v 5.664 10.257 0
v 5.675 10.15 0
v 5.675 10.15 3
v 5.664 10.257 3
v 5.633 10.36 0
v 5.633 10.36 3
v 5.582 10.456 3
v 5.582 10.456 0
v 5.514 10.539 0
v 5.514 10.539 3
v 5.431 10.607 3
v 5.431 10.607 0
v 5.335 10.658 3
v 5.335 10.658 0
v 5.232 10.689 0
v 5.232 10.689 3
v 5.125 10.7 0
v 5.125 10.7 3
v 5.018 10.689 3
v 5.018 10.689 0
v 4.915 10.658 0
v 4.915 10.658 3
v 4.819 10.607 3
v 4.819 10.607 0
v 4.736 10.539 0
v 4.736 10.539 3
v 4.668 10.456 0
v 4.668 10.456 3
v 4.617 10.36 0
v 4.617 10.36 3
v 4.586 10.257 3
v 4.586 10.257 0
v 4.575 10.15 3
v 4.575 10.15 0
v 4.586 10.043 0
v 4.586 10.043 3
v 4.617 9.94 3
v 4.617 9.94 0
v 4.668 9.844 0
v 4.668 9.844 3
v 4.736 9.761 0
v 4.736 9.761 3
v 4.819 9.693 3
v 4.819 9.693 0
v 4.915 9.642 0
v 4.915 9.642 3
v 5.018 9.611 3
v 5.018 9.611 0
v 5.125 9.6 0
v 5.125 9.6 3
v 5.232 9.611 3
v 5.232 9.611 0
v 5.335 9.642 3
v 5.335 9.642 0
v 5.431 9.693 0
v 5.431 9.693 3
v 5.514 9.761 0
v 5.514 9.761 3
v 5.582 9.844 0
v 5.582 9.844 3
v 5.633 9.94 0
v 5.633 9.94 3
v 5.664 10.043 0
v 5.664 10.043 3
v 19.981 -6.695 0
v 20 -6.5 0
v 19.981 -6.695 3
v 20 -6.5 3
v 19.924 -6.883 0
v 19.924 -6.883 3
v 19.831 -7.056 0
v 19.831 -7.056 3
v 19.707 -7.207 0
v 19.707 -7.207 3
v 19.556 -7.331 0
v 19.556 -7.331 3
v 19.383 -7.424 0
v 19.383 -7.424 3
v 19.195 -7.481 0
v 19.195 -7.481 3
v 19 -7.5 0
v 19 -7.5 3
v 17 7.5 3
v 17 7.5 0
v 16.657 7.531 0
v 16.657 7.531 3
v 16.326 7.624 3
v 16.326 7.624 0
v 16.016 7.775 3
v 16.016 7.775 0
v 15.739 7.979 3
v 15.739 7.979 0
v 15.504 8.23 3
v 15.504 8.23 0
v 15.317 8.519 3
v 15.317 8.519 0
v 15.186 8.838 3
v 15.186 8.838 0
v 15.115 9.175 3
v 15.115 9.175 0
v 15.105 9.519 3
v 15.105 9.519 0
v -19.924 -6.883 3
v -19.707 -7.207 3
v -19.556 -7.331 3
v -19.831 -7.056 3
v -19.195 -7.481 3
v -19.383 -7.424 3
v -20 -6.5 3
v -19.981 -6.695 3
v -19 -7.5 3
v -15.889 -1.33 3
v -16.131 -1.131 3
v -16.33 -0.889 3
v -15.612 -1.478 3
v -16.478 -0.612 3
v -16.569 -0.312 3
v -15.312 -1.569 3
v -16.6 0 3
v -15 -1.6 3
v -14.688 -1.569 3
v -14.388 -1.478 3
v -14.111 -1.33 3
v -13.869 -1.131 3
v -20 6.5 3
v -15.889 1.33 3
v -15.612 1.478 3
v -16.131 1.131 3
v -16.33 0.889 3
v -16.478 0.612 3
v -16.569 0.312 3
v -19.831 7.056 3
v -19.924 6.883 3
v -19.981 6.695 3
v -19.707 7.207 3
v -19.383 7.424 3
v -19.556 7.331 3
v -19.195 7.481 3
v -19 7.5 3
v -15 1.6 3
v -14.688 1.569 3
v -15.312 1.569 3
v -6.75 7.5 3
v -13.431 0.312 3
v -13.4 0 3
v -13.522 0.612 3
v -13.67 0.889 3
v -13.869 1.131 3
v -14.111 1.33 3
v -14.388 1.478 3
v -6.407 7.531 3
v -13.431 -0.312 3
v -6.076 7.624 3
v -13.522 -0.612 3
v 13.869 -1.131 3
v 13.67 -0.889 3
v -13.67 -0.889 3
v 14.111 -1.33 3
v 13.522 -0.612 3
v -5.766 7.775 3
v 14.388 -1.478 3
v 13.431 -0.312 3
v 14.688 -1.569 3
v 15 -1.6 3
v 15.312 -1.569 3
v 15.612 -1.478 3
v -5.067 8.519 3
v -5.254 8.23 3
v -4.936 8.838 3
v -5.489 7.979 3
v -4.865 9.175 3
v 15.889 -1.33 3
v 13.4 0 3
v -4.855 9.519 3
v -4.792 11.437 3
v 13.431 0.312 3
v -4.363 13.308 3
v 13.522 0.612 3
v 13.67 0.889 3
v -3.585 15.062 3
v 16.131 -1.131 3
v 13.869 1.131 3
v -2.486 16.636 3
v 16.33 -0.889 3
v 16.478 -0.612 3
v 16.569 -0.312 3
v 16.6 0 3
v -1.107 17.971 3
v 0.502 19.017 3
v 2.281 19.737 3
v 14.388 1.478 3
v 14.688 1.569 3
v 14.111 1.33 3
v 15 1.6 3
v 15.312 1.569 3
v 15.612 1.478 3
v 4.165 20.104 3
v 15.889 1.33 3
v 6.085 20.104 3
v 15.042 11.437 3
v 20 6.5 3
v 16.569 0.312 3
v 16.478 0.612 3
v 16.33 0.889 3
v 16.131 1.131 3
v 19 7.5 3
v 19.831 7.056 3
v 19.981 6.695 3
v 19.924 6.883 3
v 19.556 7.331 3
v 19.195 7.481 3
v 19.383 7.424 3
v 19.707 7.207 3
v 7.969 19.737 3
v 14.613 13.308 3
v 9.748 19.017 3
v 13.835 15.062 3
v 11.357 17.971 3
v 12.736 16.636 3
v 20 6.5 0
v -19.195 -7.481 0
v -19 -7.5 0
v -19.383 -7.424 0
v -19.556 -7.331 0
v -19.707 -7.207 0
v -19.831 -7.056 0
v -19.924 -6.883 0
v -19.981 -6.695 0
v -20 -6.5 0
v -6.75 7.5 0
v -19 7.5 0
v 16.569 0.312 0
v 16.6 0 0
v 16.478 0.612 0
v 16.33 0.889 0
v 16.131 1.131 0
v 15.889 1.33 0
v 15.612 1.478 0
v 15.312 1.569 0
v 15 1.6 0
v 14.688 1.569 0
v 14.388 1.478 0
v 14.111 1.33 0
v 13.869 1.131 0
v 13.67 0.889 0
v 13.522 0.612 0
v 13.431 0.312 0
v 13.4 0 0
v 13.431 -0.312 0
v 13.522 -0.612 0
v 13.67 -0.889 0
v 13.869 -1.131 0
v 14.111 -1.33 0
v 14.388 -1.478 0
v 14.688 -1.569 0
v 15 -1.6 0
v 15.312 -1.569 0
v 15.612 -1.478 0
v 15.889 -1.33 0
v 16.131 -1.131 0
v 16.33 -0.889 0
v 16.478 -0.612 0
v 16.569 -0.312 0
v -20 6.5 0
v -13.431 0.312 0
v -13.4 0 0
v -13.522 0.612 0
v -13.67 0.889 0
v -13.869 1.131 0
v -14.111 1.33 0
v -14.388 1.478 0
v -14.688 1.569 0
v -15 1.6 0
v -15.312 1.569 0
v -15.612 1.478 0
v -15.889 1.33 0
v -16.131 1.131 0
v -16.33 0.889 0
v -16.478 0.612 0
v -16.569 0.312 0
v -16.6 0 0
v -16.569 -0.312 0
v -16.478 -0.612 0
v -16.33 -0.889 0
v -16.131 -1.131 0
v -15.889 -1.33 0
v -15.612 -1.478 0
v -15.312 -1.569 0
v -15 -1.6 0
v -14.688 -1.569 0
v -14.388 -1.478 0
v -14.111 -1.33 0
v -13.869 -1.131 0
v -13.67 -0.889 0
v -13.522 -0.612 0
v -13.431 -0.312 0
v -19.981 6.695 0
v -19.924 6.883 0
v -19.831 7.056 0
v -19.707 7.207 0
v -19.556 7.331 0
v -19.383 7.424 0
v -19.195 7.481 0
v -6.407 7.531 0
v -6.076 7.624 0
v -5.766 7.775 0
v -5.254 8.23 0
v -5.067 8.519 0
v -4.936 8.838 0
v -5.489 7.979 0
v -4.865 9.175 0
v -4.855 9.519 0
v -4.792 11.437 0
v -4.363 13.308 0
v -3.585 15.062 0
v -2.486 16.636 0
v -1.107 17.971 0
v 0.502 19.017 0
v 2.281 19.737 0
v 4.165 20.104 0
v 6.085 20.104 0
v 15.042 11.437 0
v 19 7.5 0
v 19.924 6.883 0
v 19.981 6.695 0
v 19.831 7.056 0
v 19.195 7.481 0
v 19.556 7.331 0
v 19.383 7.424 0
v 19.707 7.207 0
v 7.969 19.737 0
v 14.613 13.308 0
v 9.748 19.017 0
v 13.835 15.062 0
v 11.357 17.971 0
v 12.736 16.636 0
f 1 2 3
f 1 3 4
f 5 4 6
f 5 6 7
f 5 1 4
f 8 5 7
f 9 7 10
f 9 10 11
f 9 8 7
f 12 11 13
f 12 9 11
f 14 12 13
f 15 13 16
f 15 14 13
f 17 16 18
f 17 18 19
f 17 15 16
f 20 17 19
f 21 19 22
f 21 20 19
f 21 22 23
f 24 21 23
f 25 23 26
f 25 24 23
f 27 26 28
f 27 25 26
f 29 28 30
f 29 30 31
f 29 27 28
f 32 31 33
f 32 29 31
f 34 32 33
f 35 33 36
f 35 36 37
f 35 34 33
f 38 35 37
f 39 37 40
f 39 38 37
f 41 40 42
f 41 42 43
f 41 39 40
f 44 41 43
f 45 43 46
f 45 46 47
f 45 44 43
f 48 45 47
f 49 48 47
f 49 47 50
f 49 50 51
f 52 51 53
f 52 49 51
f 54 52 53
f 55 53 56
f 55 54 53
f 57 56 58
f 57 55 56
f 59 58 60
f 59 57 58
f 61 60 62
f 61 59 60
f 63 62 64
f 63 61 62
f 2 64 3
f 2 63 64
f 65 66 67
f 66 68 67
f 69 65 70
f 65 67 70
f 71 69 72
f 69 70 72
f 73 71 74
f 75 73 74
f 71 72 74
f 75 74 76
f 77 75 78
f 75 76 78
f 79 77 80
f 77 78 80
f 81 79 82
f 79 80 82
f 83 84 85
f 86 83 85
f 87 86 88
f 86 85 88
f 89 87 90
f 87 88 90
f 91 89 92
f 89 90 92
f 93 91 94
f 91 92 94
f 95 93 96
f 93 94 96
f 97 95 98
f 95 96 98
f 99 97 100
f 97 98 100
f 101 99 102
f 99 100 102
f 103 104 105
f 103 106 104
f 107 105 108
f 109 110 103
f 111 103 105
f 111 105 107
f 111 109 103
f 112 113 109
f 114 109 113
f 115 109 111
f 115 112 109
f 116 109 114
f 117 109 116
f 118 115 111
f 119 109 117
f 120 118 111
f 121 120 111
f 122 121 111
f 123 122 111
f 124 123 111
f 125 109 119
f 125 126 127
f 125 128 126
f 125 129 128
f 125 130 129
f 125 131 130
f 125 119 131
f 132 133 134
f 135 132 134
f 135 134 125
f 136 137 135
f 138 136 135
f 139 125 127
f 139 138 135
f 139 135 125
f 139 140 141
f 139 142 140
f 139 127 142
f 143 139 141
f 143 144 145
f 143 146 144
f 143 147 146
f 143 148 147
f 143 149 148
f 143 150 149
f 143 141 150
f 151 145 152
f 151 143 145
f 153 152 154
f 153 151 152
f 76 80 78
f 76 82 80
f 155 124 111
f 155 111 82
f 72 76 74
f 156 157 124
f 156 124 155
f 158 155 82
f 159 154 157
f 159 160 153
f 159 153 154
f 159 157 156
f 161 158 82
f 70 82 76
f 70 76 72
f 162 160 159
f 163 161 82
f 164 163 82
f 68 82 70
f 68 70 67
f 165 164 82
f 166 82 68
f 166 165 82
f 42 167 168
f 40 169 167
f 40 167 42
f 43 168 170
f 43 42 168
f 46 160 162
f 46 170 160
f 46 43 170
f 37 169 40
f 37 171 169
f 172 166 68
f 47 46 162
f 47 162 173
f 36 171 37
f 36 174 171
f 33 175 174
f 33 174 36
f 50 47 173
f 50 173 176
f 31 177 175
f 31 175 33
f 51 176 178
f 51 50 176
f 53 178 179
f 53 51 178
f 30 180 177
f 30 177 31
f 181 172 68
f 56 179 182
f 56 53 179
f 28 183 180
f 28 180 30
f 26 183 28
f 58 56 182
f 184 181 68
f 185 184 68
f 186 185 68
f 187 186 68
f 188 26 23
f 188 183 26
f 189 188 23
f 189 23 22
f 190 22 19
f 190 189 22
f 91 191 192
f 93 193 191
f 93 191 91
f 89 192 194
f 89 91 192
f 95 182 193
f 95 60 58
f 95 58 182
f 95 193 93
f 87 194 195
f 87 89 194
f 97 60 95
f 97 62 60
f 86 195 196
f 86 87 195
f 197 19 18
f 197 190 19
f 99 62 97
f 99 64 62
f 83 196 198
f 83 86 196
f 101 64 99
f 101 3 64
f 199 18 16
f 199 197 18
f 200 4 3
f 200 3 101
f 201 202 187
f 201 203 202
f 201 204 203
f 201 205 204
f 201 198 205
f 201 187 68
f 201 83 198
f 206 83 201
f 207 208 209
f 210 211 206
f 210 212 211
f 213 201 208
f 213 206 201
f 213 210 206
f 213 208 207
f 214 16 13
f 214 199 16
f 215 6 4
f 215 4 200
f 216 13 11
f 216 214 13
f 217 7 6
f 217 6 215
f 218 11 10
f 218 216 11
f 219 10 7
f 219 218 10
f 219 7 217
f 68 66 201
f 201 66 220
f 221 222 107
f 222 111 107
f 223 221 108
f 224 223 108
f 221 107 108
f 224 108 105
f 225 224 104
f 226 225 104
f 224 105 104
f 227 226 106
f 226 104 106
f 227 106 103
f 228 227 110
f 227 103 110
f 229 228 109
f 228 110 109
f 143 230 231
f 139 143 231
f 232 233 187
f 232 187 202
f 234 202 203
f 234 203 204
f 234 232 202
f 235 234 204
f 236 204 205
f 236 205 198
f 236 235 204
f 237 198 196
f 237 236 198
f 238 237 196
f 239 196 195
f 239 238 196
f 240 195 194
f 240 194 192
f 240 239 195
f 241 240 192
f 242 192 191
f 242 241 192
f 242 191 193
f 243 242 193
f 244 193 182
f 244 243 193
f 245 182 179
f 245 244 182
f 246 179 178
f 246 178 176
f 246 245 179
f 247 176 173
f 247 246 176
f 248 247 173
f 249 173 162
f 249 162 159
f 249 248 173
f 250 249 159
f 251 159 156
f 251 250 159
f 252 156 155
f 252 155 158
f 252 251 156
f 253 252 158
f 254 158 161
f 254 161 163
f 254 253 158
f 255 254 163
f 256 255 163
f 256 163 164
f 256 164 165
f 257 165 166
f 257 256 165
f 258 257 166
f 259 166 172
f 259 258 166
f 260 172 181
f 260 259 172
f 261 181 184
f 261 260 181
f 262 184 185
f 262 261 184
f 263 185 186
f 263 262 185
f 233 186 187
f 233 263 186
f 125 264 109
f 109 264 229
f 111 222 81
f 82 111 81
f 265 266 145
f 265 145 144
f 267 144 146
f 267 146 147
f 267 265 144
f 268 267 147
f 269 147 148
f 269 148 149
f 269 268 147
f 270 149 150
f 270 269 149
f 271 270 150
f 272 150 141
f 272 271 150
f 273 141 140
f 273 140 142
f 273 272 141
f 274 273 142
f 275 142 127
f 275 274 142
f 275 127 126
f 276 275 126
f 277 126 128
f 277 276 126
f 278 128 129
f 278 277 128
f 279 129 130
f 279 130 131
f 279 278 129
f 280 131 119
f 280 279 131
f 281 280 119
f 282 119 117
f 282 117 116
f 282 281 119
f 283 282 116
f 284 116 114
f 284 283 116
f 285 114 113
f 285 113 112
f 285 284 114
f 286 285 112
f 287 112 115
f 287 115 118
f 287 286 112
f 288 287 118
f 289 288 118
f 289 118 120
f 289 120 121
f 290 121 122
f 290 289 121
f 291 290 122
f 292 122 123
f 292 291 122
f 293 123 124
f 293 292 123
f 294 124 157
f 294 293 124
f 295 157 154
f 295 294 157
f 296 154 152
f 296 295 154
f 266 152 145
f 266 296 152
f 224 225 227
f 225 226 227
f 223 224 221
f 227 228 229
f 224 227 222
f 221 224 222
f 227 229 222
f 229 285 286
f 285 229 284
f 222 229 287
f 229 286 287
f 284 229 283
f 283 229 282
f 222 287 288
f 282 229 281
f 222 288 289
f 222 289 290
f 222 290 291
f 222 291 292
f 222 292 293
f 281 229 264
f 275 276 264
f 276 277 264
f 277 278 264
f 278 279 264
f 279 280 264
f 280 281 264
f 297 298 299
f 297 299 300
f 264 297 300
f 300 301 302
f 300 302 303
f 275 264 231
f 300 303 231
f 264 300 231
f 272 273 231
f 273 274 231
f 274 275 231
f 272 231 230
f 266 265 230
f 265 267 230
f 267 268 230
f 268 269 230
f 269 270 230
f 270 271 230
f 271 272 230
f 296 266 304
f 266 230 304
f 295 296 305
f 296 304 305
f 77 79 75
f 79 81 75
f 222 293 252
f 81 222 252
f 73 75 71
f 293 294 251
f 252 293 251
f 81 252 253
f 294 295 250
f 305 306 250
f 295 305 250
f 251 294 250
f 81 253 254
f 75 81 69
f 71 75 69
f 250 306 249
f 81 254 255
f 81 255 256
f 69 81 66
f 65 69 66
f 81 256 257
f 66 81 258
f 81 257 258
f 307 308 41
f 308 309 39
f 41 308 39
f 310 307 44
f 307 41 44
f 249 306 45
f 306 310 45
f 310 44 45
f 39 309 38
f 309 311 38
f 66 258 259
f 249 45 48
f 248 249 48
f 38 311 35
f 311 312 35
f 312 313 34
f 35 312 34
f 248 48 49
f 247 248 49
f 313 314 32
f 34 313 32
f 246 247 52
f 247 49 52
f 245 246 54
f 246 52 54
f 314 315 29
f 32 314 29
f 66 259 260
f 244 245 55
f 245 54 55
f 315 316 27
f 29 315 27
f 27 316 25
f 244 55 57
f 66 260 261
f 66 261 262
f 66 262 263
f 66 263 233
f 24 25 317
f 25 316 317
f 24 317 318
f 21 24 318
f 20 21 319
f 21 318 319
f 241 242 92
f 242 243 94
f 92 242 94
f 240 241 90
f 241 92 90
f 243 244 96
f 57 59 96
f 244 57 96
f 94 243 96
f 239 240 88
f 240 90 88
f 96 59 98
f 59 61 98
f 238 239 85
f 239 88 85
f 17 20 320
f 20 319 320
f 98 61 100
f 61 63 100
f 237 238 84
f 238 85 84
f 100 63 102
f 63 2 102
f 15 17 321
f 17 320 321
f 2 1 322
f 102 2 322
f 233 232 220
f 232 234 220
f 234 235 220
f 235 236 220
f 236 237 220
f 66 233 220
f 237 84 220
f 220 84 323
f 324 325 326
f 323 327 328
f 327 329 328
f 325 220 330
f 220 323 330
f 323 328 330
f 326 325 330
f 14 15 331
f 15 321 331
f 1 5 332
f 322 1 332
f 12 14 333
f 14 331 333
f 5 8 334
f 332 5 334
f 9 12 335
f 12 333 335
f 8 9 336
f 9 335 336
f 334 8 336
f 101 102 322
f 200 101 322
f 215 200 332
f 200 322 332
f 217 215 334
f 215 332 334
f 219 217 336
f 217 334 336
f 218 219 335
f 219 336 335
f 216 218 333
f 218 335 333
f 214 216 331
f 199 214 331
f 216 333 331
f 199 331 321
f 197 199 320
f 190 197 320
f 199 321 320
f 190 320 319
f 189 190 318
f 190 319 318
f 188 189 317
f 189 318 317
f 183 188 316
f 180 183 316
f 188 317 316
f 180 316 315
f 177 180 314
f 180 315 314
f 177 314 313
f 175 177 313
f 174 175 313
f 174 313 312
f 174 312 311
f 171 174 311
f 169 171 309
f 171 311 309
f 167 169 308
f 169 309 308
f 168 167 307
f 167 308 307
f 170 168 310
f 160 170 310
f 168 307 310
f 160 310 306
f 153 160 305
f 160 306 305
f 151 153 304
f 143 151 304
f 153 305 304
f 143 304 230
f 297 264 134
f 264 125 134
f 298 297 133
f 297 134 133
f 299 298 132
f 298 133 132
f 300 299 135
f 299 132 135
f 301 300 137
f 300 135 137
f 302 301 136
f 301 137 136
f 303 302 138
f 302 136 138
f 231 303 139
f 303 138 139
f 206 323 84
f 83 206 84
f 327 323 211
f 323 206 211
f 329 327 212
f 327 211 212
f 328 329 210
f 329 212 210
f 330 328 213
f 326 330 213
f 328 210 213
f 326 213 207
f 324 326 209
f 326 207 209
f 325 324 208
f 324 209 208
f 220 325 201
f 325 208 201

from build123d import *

# Parameters (mm, degrees)
F0_R     = 1.6
F0_R_2   = 0.55
F1_DEPTH = 3
F2_R     = 1


with BuildPart() as f1:
    # F0 (on Top) → F1 (new body)
    with BuildSketch(Plane.XY):
        with BuildLine():
            Line((20, 0), (20, 7.5))
            Line((20, 7.5), (17, 7.5))
            ThreePointArc((17, 7.5), (15.615652, 8.099204), (15.105048, 9.518622))
            ThreePointArc((15.105048, 9.518622), (5.125, 20.15), (-4.855048, 9.518622))
            ThreePointArc((-4.855048, 9.518622), (-5.365652, 8.099204), (-6.75, 7.5))
            Line((-6.75, 7.5), (-20, 7.5))
            Line((-20, 7.5), (-20, 0))
            Line((-20, 0), (-20, -7.5))
            Line((-20, -7.5), (20, -7.5))
            Line((20, -7.5), (20, 0))
        make_face()
        with Locations((-15, 0)):
            Circle(F0_R, mode=Mode.SUBTRACT)
        with Locations((15, 0)):
            Circle(F0_R, mode=Mode.SUBTRACT)
        with Locations((5.125, 10.15)):
            Circle(F0_R_2, mode=Mode.SUBTRACT)
    extrude(amount=F1_DEPTH)

    # F2
    f2_edges = [f1.edges().sort_by_distance(p)[0] for p in [
        (20, -7.5, 1.5),
        (20, 7.5, 1.5),
        (-20, -7.5, 1.5),
        (-20, 7.5, 1.5),
    ]]
    fillet(f2_edges, radius=F2_R)


solid = f1.part
